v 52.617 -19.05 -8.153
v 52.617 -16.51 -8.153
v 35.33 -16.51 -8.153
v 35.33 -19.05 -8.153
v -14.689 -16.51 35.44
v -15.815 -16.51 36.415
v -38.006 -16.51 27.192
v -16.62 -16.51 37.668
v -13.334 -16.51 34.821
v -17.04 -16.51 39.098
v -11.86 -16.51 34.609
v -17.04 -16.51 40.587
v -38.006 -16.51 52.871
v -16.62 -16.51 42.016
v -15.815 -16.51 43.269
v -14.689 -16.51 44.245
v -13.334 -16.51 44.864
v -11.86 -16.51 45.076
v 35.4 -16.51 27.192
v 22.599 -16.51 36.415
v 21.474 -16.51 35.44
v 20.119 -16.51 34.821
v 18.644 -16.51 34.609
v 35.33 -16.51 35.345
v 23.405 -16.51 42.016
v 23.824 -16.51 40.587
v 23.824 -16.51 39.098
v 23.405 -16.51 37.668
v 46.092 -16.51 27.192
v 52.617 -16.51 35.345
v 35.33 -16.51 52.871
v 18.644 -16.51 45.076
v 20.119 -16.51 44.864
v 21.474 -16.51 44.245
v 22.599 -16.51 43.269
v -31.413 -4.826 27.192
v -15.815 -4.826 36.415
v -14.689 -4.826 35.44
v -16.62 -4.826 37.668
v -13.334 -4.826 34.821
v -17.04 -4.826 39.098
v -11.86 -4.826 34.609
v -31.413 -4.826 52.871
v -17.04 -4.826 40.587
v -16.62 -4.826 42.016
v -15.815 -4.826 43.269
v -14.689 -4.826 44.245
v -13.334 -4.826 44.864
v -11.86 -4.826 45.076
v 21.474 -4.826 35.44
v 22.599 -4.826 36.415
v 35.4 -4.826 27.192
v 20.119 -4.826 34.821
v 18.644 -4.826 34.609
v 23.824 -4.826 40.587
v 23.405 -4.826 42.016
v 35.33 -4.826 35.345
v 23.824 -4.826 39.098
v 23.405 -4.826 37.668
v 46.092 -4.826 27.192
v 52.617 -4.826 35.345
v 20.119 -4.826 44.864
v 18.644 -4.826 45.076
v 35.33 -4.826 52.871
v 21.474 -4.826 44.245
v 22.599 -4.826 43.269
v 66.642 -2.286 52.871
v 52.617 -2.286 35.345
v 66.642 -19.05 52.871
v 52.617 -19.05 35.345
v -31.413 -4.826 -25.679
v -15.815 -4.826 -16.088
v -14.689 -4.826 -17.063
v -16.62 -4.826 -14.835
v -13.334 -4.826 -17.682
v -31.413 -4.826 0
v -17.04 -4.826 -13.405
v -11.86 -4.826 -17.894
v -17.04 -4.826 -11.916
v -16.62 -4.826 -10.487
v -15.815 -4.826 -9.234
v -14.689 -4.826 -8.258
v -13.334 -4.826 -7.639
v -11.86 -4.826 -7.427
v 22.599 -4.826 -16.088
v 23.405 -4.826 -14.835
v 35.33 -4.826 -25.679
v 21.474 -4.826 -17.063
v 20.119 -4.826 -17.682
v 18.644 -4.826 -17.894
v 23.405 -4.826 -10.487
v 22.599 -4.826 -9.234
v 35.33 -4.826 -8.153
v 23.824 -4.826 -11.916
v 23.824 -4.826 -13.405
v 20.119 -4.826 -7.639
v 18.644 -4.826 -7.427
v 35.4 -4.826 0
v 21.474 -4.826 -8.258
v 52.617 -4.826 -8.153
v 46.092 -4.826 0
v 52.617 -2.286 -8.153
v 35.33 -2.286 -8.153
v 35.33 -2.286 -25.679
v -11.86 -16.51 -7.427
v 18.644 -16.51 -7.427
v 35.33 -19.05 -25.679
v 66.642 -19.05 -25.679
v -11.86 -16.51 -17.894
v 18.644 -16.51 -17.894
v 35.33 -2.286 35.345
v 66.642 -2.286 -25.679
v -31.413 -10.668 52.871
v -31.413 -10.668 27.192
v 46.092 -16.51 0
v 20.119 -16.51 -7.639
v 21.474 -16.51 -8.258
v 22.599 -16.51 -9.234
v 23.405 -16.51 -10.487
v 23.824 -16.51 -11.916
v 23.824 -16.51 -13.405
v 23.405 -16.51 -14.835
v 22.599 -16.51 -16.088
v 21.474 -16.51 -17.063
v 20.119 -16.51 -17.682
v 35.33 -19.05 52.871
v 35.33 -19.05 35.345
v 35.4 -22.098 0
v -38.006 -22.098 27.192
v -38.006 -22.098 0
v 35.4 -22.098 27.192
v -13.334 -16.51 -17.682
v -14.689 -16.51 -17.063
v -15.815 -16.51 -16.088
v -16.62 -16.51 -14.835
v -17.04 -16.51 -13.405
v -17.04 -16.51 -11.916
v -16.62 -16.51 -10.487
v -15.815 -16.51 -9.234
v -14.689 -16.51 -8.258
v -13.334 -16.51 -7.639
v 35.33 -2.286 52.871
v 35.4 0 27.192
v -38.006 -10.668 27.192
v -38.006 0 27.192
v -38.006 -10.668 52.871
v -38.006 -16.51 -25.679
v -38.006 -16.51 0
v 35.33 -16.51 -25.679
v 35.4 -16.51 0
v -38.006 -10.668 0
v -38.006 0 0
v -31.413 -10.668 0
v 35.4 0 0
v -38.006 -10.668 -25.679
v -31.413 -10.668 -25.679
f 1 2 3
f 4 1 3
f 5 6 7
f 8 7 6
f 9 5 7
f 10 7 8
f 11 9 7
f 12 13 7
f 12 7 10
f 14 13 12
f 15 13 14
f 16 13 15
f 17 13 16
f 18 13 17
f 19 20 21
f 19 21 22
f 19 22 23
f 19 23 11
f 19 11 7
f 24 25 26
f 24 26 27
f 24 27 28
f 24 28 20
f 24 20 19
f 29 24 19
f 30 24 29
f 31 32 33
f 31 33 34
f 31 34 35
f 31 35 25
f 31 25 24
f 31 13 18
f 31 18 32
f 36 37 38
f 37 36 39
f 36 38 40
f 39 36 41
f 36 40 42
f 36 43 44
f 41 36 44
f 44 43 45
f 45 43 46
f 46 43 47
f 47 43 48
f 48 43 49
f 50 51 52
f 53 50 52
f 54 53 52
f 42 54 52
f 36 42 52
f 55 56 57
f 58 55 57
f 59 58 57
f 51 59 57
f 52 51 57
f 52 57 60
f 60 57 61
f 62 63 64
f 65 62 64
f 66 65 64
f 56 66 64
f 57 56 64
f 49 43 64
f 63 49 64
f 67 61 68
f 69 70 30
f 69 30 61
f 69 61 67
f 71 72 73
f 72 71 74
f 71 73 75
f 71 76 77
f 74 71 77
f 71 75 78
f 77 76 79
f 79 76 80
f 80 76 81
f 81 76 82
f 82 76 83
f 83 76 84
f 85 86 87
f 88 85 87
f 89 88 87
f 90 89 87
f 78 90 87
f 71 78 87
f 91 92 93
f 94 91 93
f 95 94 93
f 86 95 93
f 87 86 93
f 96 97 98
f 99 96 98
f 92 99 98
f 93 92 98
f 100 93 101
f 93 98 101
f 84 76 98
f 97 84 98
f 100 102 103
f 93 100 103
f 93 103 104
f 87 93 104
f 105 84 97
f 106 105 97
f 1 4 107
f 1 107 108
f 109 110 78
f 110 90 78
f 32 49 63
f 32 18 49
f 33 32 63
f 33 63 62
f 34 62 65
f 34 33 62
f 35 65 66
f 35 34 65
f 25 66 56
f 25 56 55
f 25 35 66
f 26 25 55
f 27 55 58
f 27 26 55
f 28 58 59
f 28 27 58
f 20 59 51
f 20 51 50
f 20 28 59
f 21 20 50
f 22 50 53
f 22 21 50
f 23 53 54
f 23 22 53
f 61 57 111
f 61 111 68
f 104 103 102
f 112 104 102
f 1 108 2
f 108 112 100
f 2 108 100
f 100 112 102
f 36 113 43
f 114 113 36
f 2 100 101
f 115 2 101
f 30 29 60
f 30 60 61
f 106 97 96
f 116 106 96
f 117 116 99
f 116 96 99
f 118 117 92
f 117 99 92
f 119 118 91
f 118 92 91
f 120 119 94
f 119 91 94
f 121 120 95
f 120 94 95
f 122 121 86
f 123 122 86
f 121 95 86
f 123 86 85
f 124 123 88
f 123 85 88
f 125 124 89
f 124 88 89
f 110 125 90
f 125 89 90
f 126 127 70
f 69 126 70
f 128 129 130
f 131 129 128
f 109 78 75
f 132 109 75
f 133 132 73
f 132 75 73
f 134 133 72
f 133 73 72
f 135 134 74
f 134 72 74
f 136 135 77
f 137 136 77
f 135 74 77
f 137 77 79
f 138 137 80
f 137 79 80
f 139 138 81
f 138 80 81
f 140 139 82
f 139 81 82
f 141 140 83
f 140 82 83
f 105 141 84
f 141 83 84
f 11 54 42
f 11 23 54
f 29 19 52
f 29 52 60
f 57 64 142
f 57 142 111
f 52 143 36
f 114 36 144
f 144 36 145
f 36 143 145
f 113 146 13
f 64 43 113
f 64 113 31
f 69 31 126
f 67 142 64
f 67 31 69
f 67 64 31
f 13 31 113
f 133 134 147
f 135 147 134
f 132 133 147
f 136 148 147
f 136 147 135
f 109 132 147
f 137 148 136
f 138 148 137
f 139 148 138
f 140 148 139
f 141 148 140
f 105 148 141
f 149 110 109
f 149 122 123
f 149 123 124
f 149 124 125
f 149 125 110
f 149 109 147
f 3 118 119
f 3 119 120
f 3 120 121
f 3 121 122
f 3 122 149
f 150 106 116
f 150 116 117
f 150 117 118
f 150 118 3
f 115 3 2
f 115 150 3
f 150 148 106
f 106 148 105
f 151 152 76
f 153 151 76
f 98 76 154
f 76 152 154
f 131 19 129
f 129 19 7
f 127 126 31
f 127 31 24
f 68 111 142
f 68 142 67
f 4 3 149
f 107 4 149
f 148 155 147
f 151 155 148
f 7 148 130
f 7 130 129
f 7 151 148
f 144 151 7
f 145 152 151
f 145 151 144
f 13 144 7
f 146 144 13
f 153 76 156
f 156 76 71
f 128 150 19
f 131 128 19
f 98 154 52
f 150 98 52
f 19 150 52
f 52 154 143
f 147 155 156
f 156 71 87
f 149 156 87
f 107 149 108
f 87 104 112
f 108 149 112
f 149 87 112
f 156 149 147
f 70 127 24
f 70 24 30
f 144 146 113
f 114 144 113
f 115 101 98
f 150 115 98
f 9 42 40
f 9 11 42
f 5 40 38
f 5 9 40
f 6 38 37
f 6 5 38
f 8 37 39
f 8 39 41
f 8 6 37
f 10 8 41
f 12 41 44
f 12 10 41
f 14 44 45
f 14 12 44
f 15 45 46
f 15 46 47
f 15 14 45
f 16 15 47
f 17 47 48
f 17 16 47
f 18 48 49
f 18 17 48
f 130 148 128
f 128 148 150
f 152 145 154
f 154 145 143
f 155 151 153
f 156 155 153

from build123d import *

# Parameters (mm, degrees)
F1_DEPTH = 22.098
F4_DEPTH = 5.842
F5_DEPTH = 8.382
F3_W     = 6.592599522
F3_H     = 25.6785105251
F6_DEPTH = 5.842
F7_DEPTH = 5.842


with BuildPart() as f1:
    # F0 (on Front) → F1 (new body)
    with BuildSketch(Plane.XZ):
        Polygon((-38.0060652603, 0), (35.3999347397, 0), (35.3999347397, 27.1923393011), (-38.0060652603, 27.1923393011), (-38.0060652603, 18.1223209947), (-38.0060652603, 10.0105842575), align=None)
    extrude(amount=F1_DEPTH)

    # F3 (on offset) → F4 (join, symmetric)
    with BuildSketch(Plane.XZ.offset(10.668)):
        Polygon((35.3301167488, 0), (-31.4134657383, 0), (-31.4134657383, -25.6785105251), (35.3301167488, -25.6785105251), (35.3301167488, -8.1525105251), (52.6165383837, -8.1525105251), (46.0923918922, 0), align=None)
        with BuildLine():
            Line((18.6442192644, -17.8938459214), (-11.8596823886, -17.8938459214))
            ThreePointArc((-11.8596823886, -17.8938459214), (-17.0929335328, -12.6605947772), (-11.8596823886, -7.427343633))
            Line((-11.8596823886, -7.427343633), (18.6442192644, -7.427343633))
            ThreePointArc((18.6442192644, -7.427343633), (23.8774704086, -12.6605947772), (18.6442192644, -17.8938459214))
        make_face(mode=Mode.SUBTRACT)
        Polygon((-31.4134657383, 52.8708498262), (-31.4134657383, 27.1923393011), (46.0923918922, 27.1923393011), (52.6165383837, 35.3448498262), (35.3301167488, 35.3448498262), (35.3301167488, 52.8708498262), align=None)
        with BuildLine():
            ThreePointArc((18.6442192644, 45.0756415895), (23.8774704086, 39.8423904453), (18.6442192644, 34.6091393011))
            Line((18.6442192644, 34.6091393011), (-11.8596823886, 34.6091393011))
            ThreePointArc((-11.8596823886, 34.6091393011), (-17.0929335328, 39.8423904453), (-11.8596823886, 45.0756415895))
            Line((-11.8596823886, 45.0756415895), (18.6442192644, 45.0756415895))
        make_face(mode=Mode.SUBTRACT)
    extrude(amount=F4_DEPTH, both=True)

    # F3 (on offset) → F5 (join, symmetric)
    with BuildSketch(Plane.XZ.offset(10.668)):
        Polygon((35.3301167488, -8.1525105251), (35.3301167488, -25.6785105251), (66.6419347397, -25.6785105251), (52.6165383837, -8.1525105251), align=None)
        Polygon((35.3301167488, 35.3448498262), (52.6165383837, 35.3448498262), (66.6419347397, 52.8708498262), (35.3301167488, 52.8708498262), align=None)
    extrude(amount=F5_DEPTH, both=True)

    # F3 (on offset) → F6 (join, through all)
    with BuildSketch(Plane.XZ.offset(10.668)):
        with Locations((-34.7097654993, -12.8392552625)):
            Rectangle(F3_W, F3_H)
    extrude(amount=F6_DEPTH)

    # F3 (on offset) → F7 (join, through all)
    with BuildSketch(Plane.XZ.offset(10.668)):
        with Locations((-34.7097654993, 40.0315945636)):
            Rectangle(F3_W, F3_H)
    extrude(amount=F7_DEPTH)


solid = f1.part
